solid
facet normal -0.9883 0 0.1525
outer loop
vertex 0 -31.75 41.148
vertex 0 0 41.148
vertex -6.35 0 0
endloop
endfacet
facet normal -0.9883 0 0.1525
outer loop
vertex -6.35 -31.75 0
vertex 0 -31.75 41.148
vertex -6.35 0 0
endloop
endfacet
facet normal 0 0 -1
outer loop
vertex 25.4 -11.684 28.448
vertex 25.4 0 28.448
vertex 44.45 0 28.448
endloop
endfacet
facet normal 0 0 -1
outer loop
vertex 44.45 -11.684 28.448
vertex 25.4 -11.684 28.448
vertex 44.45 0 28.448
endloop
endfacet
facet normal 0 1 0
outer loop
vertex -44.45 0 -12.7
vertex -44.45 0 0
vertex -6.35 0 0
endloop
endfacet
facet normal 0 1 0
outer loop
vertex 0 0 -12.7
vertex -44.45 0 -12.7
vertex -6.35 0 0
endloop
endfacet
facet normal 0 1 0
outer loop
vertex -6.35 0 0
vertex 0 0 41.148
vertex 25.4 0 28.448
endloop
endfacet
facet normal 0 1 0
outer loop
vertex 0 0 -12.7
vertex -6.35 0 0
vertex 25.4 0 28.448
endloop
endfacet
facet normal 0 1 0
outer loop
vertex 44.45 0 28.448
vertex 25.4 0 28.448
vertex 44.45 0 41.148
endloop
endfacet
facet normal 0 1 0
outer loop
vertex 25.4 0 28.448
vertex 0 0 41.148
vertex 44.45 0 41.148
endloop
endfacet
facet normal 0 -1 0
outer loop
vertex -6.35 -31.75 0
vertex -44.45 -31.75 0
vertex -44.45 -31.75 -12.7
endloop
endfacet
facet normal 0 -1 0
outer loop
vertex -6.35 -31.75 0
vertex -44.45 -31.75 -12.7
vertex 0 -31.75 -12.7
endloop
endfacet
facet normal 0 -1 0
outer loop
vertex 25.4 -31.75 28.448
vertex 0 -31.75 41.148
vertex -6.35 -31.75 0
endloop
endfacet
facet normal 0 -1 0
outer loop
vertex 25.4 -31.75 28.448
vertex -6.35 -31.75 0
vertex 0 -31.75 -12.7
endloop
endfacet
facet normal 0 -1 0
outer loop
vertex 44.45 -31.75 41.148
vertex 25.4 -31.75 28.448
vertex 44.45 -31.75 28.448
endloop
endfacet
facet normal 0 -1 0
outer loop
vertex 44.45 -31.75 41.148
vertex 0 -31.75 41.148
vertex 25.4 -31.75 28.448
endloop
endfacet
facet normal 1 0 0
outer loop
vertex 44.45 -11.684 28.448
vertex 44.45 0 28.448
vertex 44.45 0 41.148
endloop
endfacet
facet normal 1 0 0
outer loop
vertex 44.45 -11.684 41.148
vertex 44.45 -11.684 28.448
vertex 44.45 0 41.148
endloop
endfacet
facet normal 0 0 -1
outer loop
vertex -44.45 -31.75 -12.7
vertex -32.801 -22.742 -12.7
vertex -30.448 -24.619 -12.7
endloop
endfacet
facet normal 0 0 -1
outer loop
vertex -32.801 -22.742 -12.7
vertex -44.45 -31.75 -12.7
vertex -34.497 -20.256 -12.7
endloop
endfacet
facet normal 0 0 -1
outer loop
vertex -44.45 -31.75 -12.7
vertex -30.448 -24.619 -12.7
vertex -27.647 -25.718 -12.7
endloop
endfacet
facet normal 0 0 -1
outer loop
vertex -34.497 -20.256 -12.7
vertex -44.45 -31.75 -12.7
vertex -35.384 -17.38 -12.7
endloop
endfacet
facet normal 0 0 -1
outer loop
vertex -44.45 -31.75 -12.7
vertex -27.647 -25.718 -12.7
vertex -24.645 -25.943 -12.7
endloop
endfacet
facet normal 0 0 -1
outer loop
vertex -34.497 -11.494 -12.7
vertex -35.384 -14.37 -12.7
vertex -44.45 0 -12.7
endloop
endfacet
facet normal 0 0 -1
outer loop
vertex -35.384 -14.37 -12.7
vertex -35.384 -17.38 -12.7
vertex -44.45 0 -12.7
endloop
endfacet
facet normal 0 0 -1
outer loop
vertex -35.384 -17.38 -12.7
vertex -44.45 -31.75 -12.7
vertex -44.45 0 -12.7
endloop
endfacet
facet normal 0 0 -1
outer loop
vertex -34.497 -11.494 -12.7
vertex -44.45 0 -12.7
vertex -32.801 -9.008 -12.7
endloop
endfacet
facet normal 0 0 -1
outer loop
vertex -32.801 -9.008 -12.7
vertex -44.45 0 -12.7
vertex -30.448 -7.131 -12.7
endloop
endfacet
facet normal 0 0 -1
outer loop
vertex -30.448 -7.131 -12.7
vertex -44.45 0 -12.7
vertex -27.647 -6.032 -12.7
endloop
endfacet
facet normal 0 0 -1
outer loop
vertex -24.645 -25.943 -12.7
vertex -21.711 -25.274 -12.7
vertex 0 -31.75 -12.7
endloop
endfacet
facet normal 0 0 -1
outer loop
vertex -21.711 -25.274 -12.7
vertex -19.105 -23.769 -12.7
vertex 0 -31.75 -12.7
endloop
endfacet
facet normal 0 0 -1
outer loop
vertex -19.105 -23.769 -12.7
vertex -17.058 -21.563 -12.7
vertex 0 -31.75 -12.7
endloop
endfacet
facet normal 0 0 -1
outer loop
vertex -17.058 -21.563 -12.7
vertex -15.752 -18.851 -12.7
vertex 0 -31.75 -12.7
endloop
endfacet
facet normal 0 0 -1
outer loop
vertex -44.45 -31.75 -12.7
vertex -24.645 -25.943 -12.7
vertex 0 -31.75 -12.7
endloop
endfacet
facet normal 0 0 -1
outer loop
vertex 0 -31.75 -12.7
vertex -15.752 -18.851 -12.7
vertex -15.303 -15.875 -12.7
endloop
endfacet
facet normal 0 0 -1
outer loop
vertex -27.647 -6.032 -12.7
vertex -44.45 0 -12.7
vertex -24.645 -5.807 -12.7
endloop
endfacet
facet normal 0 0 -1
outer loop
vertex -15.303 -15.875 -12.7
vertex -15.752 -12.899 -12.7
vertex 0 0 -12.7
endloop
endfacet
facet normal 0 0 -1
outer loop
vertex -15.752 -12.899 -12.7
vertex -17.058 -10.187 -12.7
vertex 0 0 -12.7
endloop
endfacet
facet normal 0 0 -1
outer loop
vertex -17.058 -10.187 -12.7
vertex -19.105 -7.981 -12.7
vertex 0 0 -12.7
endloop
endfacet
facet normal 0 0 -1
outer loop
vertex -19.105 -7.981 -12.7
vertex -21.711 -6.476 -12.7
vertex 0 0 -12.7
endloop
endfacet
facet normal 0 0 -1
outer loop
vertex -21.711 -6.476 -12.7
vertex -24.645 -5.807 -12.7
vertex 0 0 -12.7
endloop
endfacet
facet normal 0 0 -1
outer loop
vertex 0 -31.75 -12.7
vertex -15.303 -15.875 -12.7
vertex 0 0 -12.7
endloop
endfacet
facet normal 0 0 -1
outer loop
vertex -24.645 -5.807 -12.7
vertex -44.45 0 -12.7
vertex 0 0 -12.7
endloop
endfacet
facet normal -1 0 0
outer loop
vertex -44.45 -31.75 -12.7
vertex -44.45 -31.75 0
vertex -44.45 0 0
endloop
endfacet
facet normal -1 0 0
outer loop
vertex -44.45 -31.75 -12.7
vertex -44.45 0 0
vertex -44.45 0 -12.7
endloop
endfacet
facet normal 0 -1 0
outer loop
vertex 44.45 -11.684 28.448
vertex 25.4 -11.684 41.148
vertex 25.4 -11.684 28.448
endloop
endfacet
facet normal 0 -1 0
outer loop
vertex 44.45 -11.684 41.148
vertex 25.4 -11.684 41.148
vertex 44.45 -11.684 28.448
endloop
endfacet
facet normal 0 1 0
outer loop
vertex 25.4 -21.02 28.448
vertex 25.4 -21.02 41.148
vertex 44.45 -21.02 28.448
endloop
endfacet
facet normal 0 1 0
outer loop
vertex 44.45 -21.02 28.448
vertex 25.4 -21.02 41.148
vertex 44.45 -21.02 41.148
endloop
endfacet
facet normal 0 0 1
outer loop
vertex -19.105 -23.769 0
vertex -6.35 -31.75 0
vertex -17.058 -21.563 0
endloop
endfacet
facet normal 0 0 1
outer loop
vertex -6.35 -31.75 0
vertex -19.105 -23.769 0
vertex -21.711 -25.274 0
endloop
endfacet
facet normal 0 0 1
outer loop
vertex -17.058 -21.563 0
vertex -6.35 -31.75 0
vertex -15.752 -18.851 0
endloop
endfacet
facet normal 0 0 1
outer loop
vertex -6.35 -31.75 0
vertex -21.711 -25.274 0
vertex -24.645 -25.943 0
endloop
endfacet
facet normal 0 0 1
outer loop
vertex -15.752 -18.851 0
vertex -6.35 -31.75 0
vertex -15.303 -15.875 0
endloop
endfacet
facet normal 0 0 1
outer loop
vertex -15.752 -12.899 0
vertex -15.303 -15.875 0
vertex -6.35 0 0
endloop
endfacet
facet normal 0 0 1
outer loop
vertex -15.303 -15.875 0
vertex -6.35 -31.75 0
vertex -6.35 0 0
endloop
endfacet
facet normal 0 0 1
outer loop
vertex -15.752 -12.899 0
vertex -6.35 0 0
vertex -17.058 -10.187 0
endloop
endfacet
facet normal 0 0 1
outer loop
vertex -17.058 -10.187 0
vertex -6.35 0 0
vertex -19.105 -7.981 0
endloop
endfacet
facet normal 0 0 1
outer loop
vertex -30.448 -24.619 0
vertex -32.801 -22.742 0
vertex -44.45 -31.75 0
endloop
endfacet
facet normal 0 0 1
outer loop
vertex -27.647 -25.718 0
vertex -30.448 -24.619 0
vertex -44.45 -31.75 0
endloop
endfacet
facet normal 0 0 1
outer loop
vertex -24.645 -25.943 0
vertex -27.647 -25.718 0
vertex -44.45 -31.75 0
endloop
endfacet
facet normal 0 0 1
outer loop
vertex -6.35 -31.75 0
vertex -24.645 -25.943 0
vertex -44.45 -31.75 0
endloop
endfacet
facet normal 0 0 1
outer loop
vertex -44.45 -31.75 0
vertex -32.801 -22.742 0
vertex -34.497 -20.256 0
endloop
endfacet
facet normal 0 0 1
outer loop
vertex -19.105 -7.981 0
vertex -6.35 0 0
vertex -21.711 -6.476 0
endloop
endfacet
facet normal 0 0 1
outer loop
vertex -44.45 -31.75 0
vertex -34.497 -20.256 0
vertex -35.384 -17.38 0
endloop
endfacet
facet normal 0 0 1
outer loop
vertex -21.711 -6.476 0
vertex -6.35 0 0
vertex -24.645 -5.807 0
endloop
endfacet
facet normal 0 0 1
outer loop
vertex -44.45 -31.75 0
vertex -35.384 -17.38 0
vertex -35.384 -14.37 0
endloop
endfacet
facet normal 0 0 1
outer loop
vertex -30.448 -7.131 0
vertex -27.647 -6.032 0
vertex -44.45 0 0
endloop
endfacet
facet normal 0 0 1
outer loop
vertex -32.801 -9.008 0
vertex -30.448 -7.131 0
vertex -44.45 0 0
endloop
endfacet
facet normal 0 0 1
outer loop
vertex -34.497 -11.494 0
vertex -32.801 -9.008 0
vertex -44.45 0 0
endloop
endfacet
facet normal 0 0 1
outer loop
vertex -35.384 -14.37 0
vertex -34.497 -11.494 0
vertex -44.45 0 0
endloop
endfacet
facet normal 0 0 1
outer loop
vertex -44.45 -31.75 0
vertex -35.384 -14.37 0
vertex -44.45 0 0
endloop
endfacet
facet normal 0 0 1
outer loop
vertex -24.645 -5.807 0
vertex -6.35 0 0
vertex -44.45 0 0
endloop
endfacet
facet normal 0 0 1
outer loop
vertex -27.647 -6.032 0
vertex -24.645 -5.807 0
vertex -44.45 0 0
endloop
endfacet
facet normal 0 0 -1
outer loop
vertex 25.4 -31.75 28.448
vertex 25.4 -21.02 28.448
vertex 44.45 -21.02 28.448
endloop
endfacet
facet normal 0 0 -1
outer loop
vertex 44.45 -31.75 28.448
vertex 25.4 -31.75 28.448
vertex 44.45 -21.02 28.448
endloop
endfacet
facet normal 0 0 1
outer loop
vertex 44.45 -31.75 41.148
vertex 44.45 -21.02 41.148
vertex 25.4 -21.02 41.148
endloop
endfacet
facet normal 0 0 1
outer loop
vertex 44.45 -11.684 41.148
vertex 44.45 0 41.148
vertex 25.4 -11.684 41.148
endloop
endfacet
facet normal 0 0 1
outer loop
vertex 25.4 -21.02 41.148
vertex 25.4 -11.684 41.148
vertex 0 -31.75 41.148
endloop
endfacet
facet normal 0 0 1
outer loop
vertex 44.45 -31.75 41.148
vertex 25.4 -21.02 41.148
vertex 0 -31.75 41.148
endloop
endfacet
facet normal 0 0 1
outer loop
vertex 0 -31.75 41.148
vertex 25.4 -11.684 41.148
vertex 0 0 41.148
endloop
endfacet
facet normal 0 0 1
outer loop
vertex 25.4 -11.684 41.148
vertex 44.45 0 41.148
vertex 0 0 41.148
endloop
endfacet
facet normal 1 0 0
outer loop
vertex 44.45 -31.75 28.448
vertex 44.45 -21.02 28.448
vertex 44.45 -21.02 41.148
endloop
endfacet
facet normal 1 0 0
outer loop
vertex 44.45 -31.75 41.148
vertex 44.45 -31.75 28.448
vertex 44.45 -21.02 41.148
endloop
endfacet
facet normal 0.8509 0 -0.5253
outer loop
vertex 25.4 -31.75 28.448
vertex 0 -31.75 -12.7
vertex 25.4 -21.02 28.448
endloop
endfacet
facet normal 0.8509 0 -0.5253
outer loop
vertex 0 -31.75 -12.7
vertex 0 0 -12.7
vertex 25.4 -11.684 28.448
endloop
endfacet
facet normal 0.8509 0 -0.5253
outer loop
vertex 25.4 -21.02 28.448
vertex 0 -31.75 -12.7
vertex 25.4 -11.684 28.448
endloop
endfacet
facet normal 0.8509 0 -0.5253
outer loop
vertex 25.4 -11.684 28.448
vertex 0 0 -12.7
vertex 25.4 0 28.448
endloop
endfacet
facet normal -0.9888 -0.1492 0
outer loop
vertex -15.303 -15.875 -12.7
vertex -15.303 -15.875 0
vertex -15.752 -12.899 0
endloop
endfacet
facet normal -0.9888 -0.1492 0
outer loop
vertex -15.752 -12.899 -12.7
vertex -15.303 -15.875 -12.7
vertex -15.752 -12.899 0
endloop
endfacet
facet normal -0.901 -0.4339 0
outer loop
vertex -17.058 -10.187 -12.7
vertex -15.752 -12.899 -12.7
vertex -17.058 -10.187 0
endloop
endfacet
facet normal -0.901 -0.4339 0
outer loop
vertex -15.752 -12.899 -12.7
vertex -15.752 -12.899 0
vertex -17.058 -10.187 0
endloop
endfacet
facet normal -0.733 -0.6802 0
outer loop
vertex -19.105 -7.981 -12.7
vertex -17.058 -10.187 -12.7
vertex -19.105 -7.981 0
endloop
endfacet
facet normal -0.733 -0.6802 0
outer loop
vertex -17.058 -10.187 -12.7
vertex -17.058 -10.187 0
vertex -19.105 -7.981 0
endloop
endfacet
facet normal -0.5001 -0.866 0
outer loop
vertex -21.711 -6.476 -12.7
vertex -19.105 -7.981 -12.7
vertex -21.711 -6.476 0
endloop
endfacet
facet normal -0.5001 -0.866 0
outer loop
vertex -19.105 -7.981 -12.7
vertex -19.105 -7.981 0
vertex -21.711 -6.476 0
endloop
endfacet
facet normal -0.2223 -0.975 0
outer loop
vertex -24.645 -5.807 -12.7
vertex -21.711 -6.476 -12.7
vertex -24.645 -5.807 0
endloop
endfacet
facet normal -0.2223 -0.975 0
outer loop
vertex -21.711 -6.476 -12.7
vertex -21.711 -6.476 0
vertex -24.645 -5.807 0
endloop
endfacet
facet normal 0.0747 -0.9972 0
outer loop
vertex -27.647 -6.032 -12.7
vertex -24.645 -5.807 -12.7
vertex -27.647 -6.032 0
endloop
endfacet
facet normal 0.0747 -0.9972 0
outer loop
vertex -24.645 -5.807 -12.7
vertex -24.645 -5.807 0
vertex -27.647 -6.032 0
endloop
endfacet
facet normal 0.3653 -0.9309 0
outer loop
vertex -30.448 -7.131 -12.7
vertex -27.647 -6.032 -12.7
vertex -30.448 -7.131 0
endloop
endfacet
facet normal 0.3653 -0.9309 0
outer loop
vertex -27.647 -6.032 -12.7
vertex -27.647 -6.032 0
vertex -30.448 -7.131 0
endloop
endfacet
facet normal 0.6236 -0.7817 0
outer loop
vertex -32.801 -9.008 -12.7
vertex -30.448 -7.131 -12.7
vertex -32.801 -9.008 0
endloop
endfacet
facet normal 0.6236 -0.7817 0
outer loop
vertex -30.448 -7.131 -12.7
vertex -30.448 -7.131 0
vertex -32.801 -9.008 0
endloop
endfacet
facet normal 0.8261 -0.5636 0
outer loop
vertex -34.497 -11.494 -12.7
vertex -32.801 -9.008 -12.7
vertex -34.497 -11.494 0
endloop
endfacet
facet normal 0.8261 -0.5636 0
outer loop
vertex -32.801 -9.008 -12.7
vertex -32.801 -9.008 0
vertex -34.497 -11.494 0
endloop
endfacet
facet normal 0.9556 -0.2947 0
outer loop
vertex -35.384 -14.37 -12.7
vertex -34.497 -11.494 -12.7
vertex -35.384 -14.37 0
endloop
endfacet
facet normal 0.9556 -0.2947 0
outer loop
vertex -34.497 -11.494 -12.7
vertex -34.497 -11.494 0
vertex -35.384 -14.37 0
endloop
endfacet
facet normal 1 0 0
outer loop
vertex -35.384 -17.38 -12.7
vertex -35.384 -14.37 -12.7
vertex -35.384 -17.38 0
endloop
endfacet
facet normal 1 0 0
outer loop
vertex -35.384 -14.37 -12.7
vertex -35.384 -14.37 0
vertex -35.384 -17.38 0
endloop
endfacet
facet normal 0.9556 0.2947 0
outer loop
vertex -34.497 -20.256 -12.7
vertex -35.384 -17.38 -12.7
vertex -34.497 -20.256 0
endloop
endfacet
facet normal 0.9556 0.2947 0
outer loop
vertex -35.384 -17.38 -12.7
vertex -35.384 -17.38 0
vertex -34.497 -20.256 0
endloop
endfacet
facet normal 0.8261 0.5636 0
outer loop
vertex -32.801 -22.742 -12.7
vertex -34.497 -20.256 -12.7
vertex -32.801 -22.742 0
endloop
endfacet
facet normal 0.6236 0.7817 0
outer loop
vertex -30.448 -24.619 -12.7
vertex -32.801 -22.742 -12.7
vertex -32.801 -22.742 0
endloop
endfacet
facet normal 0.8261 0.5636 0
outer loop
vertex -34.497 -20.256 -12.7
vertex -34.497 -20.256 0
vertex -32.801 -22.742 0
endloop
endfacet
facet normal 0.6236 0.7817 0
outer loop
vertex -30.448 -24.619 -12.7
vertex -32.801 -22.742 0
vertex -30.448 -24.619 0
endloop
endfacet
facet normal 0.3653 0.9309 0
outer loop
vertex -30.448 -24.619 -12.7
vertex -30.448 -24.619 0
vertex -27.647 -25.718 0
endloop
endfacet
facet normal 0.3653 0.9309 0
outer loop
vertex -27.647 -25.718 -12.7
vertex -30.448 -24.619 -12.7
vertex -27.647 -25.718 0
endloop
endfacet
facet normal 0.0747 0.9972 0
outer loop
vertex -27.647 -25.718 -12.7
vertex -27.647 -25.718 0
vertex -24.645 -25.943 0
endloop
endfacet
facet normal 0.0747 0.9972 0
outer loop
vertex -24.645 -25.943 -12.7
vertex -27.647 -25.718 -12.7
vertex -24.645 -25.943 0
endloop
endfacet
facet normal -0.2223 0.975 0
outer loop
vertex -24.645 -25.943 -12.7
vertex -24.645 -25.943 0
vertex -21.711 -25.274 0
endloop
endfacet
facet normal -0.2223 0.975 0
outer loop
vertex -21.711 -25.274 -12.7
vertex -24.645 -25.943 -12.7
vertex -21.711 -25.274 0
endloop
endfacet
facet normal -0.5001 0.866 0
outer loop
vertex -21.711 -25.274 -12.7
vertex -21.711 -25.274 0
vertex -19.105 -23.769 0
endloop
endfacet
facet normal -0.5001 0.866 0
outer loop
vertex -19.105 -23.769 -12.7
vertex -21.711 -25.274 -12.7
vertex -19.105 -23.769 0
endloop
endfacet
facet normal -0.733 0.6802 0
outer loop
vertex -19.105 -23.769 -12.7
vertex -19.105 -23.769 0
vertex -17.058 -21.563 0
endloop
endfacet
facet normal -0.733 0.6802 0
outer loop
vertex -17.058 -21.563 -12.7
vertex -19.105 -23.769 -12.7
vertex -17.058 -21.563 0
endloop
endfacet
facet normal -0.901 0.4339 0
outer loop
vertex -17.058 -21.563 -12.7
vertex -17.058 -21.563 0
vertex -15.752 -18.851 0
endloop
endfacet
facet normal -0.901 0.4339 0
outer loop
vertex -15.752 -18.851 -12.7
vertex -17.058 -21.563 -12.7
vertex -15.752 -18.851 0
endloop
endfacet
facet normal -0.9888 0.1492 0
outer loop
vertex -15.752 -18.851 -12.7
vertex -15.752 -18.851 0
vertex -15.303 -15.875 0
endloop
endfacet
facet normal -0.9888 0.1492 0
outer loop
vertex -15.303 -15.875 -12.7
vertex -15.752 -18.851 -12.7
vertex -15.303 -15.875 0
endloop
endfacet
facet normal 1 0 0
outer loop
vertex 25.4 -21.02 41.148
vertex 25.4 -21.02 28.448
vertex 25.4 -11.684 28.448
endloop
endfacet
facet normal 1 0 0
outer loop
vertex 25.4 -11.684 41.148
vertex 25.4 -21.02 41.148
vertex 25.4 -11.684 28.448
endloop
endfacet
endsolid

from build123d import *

# Parameters (mm, degrees)
F1_DEPTH = 31.75
F2_R     = 10.096628
F3_DEPTH = 15.748
F4_W     = 19.05
F4_H     = 9.336647
F5_DEPTH = 12.7


with BuildPart() as f1:
    # F0 (on Front) → F1 (new body)
    with BuildSketch(Plane.XZ):
        Polygon((-6.35, 0), (-44.45, 0), (-44.45, -12.7), (0, -12.7), (25.4, 28.448), (44.45, 28.448), (44.45, 41.148), (0, 41.148), align=None)
    extrude(amount=F1_DEPTH)

    # F2 (on face) → F3 (cut)
    with BuildSketch(Plane.XY):
        with Locations((-25.4, -15.875)):
            Circle(F2_R)
    extrude(amount=-F3_DEPTH, mode=Mode.SUBTRACT)

    # F4 (on face) → F5 (cut)
    with BuildSketch(Plane.XY.offset(41.148)):
        with Locations((34.925, -16.351854)):
            Rectangle(F4_W, F4_H)
    extrude(amount=-F5_DEPTH, mode=Mode.SUBTRACT)


solid = f1.part
